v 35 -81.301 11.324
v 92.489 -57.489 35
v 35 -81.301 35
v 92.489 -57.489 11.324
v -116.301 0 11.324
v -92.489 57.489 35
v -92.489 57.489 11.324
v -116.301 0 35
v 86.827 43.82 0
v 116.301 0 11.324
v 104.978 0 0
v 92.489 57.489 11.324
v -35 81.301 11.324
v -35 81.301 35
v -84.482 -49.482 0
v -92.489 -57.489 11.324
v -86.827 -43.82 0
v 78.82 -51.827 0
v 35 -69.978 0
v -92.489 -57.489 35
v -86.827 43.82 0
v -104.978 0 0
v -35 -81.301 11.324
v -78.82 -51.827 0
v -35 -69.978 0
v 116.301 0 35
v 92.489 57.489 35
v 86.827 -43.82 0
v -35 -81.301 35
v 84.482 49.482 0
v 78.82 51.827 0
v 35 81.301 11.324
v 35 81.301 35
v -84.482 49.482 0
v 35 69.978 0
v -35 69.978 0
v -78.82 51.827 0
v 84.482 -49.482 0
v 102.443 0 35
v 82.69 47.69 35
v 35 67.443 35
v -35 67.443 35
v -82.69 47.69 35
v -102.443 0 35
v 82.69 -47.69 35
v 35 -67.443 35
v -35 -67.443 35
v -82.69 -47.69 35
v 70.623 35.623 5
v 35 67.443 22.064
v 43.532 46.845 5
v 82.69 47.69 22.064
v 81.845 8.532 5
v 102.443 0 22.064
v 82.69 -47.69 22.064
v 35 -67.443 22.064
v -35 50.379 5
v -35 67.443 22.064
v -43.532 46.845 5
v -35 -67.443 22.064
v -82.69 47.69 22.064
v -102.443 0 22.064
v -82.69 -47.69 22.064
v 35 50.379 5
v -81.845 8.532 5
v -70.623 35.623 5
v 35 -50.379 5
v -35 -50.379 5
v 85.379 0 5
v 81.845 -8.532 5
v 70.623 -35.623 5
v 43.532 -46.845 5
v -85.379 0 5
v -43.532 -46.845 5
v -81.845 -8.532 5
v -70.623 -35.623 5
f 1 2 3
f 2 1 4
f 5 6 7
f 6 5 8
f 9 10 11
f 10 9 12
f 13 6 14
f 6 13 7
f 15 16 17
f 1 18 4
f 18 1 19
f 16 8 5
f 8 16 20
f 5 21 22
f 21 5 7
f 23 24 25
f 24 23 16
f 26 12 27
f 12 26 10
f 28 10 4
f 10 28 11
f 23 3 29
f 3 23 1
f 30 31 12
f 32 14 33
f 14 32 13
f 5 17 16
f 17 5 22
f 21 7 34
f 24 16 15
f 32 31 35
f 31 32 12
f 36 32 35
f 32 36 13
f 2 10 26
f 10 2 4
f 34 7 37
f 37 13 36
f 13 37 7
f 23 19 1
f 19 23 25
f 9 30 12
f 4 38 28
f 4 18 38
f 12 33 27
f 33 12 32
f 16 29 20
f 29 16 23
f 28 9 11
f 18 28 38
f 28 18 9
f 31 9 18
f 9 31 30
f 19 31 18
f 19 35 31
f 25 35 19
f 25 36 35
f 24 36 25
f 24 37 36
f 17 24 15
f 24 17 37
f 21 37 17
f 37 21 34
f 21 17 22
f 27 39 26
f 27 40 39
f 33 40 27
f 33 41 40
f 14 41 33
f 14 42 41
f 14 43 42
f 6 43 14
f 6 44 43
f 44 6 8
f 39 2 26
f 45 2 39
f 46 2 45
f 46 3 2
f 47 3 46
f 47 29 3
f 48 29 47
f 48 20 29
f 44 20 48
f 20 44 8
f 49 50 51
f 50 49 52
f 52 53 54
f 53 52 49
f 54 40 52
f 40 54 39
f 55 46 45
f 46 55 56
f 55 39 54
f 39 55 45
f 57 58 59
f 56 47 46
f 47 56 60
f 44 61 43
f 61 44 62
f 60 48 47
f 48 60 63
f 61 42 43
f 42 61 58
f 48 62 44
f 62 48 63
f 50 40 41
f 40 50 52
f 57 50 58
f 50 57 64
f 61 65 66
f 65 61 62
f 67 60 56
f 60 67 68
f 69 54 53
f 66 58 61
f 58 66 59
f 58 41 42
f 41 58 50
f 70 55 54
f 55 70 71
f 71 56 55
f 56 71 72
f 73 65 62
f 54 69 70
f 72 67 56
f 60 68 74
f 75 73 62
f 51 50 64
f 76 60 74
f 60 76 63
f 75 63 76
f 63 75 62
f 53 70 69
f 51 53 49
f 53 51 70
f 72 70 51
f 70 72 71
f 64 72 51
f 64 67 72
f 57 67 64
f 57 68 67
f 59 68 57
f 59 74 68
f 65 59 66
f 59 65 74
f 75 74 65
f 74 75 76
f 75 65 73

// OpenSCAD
//
// Created by Patrick Bailey iQless.com
//
////////////////////////////////////////
$fn=200;

rim_depth = 15;
bottom_thickness = 5;
fn_num = 8;
top_cut = 35;

difference(){
  difference(){
    hull(){
      translate([-35,0,45]){
        sphere(88, $fn=fn_num);
      }
      translate([35,0,45]){
        sphere(88, $fn=fn_num);
      }
    }

    translate([0,0,-200]){
      cube(400, center=true);
    }
    translate([0,0,200+top_cut]){
      cube(400, center=true);
    }
  }


  translate([0,0,bottom_thickness]){
    difference(){
      hull(){
        translate([-35,0,45]){
          sphere(88-rim_depth, $fn=fn_num);
        }
        translate([35,0,45]){
          sphere(88 - rim_depth, $fn=fn_num);
        }
      }

      translate([0,0,-200]){
        cube(400, center=true);
      }
      translate([0,0,200+top_cut]){
        cube(400, center=true);
      }
    }
  }
}
